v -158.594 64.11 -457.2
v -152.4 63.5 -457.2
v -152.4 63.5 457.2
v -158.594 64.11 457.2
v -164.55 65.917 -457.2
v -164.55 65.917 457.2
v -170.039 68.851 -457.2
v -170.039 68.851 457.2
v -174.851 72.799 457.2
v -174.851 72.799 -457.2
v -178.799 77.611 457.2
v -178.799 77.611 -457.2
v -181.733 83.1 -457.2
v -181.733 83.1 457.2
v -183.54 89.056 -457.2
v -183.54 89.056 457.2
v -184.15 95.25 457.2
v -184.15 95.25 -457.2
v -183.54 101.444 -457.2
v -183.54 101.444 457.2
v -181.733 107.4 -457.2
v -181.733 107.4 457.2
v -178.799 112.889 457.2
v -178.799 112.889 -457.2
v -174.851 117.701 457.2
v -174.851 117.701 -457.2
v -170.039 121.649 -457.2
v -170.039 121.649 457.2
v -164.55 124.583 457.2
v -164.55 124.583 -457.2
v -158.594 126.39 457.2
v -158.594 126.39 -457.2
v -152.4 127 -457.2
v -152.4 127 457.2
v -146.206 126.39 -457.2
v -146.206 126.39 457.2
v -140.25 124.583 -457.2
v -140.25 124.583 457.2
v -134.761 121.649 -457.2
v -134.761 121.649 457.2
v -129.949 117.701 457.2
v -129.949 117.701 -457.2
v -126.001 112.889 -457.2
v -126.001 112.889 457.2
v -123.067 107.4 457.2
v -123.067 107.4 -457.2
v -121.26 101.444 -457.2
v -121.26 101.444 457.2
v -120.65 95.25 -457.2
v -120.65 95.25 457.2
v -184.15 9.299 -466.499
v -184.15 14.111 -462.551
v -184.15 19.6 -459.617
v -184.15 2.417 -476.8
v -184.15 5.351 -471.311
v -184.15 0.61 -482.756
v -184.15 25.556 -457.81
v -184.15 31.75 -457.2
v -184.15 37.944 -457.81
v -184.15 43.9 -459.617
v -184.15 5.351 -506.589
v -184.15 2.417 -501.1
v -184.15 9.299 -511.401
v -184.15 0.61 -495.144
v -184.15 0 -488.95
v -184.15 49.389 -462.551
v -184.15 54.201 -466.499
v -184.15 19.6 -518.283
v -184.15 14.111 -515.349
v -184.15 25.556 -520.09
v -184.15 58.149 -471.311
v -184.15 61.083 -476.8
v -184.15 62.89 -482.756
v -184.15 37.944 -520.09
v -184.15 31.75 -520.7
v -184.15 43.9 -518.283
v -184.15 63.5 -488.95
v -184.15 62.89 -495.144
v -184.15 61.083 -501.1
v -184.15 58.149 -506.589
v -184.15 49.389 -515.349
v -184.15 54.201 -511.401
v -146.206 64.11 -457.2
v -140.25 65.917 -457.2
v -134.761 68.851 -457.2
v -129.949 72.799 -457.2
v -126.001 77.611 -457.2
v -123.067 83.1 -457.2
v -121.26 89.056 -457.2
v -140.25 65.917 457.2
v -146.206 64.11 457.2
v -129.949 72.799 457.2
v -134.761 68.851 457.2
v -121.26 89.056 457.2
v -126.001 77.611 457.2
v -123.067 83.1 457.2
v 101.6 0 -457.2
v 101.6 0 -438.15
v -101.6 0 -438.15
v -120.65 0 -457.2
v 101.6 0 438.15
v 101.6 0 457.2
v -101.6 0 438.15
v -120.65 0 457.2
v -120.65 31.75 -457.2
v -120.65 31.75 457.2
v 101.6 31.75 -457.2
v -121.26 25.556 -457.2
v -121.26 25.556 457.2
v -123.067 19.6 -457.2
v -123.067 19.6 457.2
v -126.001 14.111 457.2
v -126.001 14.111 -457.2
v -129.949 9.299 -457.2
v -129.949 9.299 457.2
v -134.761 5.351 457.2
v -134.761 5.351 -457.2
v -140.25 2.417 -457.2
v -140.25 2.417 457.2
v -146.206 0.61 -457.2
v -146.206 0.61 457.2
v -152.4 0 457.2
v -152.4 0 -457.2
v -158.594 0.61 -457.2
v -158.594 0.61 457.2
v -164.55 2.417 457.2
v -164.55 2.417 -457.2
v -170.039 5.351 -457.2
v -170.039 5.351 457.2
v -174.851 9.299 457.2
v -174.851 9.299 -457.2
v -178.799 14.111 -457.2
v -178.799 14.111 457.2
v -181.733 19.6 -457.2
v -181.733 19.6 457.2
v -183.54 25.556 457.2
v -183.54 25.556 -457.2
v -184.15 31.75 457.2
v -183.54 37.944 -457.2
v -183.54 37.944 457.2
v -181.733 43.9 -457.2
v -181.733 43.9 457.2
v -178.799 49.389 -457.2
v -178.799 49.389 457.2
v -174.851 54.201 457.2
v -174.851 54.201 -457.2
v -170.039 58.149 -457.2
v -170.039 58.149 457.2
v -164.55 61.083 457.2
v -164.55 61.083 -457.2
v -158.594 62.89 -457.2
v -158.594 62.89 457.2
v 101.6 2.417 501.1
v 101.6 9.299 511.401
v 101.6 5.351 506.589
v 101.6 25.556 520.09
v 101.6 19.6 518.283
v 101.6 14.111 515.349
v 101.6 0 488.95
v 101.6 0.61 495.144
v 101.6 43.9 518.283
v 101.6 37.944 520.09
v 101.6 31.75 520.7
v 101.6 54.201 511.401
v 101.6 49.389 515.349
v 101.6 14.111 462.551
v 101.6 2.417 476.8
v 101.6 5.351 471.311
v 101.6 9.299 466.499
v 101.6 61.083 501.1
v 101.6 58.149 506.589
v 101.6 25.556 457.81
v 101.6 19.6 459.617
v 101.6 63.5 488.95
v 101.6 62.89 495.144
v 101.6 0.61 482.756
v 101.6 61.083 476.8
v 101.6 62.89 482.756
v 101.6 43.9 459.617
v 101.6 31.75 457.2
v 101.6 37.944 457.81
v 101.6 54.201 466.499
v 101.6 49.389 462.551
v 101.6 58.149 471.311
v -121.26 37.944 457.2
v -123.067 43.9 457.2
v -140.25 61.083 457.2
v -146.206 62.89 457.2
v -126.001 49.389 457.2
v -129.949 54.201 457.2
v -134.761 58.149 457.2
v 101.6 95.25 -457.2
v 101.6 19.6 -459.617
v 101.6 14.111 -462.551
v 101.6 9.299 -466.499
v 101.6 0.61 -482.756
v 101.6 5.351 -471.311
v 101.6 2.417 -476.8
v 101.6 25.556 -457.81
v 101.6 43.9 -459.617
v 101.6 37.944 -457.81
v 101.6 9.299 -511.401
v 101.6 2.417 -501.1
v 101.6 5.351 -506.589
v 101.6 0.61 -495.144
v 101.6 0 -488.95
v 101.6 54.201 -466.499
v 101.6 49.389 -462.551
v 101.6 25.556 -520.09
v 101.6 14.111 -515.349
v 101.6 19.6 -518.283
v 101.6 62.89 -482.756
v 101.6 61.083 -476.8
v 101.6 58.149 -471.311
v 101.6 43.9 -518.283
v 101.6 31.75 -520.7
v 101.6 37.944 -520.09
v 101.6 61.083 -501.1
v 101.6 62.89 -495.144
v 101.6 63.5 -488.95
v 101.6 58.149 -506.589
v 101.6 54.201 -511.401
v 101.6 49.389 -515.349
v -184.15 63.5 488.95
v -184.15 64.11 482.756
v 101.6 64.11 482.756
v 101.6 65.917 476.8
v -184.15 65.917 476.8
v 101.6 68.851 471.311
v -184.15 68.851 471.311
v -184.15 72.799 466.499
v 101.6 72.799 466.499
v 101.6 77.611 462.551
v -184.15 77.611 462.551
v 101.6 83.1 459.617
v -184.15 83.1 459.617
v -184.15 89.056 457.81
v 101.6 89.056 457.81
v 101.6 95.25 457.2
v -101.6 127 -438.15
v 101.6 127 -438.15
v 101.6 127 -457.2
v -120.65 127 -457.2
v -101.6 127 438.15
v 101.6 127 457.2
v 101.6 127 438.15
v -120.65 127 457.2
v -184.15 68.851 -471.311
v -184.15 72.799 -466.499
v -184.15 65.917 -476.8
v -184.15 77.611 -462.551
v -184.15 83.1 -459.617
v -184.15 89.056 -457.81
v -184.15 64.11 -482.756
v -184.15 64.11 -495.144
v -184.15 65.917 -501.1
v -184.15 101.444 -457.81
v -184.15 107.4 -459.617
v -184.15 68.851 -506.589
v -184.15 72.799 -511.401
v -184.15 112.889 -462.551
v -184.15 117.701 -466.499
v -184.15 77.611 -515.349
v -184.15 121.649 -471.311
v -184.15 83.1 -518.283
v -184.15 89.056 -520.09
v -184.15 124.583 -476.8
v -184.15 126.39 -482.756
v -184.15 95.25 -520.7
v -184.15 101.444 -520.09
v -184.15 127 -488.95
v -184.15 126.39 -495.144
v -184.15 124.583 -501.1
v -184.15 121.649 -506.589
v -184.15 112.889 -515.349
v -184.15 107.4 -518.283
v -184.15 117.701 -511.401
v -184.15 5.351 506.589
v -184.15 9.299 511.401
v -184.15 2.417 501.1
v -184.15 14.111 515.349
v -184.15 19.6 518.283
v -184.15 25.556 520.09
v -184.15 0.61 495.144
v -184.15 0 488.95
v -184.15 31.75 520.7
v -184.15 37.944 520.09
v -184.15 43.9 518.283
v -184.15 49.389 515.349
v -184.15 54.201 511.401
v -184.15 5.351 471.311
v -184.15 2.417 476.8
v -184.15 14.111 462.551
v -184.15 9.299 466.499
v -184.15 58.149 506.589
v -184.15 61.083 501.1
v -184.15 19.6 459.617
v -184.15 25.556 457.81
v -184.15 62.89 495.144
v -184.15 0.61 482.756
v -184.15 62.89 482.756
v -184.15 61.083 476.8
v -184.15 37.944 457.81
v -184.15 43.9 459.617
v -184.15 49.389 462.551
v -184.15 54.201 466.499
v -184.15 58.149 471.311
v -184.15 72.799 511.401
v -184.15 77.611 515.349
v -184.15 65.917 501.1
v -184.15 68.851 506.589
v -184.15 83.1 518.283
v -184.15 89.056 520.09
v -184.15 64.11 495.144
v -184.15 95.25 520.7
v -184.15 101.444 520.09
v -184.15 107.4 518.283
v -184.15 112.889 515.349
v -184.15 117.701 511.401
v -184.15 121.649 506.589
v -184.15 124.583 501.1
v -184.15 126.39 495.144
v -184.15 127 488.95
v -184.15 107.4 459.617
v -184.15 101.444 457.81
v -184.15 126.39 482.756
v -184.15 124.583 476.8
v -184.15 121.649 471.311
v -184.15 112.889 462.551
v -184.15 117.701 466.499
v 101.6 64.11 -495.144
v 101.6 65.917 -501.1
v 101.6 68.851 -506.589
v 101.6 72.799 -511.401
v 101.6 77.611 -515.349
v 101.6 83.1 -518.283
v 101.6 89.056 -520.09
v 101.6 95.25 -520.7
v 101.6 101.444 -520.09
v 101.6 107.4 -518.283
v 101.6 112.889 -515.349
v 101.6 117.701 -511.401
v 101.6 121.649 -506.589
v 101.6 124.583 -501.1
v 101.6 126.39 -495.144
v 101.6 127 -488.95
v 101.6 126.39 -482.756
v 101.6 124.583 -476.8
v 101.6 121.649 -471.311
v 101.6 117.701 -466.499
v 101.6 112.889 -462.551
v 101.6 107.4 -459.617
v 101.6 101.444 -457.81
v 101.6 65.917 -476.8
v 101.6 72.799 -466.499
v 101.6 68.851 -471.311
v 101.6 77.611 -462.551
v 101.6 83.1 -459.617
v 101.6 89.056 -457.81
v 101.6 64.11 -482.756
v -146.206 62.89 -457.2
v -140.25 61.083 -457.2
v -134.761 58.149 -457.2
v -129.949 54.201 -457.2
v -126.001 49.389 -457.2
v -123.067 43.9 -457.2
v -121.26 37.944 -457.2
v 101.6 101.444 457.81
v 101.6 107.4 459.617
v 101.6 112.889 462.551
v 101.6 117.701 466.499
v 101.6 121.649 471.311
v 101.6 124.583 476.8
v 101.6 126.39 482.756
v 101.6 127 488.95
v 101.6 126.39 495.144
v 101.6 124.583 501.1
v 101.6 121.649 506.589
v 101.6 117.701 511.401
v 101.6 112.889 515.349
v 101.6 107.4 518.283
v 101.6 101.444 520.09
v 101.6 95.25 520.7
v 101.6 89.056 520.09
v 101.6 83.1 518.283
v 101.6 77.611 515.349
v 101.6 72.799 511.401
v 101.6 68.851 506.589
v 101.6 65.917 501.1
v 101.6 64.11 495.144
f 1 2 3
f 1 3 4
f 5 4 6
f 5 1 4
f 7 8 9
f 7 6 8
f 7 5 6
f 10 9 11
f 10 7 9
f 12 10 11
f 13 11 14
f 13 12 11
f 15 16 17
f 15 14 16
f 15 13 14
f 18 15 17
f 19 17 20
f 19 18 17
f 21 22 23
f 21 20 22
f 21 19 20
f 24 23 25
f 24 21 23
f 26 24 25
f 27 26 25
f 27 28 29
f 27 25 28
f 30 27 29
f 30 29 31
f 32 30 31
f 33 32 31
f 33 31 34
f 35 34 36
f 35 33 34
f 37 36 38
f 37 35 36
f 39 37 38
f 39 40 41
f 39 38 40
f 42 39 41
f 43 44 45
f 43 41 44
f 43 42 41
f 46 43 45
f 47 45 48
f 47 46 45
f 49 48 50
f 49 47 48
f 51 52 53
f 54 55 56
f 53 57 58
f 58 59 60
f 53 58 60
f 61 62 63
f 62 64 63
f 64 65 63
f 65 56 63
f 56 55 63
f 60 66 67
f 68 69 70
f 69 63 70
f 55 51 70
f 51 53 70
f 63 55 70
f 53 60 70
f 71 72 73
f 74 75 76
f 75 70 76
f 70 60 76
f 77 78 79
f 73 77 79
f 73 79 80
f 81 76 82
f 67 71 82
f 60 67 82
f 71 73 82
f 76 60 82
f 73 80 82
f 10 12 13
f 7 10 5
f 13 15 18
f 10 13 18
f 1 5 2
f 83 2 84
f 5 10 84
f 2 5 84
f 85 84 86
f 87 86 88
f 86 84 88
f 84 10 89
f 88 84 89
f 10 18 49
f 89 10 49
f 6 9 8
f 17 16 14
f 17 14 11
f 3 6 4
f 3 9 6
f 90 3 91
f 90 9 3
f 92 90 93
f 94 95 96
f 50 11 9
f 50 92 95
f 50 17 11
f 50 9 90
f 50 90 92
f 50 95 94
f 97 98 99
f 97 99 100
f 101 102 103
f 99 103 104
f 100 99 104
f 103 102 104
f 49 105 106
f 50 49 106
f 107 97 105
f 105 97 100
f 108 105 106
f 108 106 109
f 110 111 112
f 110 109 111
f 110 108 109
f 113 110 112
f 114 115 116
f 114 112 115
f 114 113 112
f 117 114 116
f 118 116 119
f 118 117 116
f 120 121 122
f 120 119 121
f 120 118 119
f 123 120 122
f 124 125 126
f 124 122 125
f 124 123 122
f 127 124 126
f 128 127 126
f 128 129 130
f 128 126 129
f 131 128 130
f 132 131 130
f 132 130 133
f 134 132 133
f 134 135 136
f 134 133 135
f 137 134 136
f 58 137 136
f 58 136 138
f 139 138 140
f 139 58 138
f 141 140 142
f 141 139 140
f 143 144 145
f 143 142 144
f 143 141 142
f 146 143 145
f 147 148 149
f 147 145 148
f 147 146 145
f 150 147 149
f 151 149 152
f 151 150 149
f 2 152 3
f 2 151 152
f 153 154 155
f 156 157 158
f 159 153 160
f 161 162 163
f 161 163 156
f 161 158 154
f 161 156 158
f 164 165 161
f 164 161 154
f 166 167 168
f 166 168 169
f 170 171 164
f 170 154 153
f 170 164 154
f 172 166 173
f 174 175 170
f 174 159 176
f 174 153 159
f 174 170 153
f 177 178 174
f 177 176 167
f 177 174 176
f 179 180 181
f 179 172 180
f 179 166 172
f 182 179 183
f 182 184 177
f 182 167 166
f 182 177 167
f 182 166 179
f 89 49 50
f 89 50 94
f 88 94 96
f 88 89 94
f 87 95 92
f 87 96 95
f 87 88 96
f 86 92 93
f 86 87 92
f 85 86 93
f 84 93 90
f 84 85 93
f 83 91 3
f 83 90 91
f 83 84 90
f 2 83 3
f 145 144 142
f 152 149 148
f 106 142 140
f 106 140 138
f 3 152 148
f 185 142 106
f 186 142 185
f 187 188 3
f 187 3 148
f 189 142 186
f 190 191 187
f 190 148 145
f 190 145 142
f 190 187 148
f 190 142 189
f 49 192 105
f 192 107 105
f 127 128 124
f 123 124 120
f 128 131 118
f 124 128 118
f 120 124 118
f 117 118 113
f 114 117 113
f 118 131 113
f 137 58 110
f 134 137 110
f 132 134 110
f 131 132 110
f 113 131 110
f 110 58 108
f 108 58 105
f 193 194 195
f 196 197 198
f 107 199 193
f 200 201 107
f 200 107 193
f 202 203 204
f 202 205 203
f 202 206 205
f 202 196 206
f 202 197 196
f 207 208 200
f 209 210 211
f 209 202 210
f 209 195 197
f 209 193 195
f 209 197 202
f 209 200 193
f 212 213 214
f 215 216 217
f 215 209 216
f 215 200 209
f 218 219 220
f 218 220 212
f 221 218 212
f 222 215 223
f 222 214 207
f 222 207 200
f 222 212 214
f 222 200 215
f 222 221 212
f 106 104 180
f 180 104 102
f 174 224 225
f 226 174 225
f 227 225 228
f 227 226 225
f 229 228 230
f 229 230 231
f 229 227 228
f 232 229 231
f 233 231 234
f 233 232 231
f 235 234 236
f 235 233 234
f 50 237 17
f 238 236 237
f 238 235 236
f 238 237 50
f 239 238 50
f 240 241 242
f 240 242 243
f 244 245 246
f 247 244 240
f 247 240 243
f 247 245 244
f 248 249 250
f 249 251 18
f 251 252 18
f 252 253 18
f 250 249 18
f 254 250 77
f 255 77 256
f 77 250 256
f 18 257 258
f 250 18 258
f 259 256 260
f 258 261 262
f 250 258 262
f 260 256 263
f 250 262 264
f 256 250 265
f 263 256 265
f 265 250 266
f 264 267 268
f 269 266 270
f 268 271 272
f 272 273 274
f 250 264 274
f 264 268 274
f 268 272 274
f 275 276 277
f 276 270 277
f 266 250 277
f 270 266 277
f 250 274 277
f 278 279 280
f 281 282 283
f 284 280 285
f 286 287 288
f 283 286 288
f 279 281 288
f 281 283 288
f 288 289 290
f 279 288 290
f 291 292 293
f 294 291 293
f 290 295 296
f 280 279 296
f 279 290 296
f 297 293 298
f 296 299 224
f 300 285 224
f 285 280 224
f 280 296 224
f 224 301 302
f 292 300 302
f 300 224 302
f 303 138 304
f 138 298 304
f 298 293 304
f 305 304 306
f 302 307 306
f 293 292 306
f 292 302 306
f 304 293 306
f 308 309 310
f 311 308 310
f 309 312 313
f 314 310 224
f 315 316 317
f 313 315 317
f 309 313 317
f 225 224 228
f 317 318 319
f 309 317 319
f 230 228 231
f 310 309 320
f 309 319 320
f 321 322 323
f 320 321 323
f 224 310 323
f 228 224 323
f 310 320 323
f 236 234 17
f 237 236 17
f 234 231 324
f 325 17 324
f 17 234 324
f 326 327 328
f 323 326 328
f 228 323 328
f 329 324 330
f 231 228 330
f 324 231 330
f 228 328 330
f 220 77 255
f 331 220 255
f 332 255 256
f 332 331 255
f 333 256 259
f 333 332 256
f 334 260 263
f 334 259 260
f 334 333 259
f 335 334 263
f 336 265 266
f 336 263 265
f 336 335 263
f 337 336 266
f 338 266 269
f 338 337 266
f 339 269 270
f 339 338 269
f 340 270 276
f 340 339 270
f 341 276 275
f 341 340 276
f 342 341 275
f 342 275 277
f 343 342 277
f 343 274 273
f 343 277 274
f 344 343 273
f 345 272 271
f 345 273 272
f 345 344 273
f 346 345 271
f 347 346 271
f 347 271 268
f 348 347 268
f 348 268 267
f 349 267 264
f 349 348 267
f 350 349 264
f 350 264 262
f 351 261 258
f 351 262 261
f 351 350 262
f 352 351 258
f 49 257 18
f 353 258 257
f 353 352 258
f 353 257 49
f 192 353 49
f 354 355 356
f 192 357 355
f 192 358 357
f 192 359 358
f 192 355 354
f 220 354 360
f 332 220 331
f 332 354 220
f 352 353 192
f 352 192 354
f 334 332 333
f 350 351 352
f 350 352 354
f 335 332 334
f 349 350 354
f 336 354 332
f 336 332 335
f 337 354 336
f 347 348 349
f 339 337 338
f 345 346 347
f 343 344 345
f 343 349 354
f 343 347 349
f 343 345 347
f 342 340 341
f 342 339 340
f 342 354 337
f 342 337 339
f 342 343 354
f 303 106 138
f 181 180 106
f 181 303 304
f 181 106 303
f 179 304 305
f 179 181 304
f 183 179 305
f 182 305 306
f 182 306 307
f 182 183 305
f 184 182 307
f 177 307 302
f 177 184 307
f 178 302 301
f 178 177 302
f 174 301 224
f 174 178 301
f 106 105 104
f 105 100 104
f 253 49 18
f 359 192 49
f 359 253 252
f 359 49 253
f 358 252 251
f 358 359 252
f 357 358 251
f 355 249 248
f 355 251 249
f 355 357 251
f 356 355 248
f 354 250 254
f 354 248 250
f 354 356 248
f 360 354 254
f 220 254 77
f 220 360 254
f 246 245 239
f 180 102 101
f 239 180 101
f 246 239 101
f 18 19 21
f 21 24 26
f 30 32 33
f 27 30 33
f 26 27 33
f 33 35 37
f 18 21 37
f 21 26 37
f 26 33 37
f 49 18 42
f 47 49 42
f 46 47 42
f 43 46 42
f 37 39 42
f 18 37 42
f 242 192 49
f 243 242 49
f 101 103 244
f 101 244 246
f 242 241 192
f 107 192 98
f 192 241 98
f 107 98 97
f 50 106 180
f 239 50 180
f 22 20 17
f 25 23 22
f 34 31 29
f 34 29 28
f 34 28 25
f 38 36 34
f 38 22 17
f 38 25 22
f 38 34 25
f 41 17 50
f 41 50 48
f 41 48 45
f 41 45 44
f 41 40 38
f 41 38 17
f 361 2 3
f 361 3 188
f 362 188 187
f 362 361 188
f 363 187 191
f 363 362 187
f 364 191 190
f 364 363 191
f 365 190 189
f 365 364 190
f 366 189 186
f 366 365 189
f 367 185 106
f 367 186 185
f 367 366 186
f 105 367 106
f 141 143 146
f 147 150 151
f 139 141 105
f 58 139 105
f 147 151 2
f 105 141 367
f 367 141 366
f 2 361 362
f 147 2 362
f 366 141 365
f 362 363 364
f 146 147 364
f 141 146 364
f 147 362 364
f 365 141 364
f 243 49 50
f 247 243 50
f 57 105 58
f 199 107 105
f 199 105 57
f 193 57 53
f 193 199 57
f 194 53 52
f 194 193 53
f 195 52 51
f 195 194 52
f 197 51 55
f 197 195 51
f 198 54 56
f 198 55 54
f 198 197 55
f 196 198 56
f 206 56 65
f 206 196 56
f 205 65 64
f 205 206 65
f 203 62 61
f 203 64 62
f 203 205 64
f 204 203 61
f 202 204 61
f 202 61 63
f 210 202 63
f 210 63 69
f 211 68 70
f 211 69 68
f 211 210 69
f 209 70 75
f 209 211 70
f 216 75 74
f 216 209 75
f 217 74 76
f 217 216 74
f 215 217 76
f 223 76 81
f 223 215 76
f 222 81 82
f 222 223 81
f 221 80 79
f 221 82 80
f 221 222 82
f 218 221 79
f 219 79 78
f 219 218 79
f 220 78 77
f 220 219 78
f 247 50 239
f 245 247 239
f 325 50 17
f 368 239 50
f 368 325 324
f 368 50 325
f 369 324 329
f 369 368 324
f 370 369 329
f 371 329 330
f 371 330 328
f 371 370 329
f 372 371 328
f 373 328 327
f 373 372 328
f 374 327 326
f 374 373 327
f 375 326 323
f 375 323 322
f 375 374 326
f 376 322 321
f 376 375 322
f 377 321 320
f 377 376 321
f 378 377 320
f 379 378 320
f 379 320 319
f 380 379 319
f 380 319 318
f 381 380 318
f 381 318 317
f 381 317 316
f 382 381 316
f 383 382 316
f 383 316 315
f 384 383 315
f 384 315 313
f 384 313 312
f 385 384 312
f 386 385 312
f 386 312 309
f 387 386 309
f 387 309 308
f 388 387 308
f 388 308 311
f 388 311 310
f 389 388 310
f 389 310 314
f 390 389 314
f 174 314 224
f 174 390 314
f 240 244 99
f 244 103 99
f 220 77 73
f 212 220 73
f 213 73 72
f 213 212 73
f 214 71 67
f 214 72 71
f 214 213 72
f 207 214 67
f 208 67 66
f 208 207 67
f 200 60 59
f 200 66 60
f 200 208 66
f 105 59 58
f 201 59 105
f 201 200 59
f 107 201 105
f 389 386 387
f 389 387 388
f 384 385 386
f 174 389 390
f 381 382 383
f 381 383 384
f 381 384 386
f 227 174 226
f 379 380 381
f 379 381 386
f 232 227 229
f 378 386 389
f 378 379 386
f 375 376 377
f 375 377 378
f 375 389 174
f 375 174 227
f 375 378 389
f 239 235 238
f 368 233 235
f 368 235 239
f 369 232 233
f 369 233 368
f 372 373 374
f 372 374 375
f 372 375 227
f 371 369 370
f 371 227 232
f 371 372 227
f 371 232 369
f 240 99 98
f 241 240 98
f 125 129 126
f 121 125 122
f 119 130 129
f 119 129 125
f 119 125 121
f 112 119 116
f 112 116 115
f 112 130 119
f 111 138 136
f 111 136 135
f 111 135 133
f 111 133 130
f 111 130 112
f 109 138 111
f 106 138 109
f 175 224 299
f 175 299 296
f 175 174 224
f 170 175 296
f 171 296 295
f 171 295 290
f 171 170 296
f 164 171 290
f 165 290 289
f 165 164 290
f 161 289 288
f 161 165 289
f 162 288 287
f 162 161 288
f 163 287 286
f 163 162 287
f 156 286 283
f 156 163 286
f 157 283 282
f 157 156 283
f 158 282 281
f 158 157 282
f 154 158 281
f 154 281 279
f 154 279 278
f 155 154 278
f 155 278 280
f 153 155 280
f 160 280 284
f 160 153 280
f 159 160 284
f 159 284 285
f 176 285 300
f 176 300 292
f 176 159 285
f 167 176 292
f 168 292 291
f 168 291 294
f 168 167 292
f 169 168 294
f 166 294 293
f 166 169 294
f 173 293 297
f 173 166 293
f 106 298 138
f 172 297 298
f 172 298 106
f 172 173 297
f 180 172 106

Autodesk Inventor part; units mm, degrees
ref_plane "YZ Plane" through (0, 0, 0) normal (1, 0, 0) x (0, 1, 0)
ref_plane "XZ Plane" through (0, 0, 0) normal (0, 1, 0) x (-1, 0, 0)
ref_plane "XY Plane" through (0, 0, 0) normal (0, 0, 1) x (1, 0, 0)
sketch "Sketch1" plane through (0, 0, 0) normal (0, 1, 0) x (-1, 0, 0)
  line L0 (101.6, 438.15) -> (101.6, -438.15)
  line L1 (101.6, -438.15) -> (-101.6, -438.15)
  line L2 (101.6, 438.15) -> (-101.6, 438.15)
  line L3 (-101.6, -438.15) -> (-101.6, -457.2)
  line L4 (-101.6, -457.2) -> (120.65, -457.2)
  line L5 (120.65, -457.2) -> (120.65, 457.2)
  line L6 (120.65, 457.2) -> (-101.6, 457.2)
  line L7 (-101.6, 457.2) -> (-101.6, 438.15)
  line L8 (0, -640.08) -> (0, 640.08) construction
  line L9 (165.1, 0) -> (-146.05, 0) construction
  point P0 (0, 0)
  dimension "d0" = 876.3
  dimension "d1" = 203.2
  dimension "d2" = 19.05
  dimension "d3" = 19.05
extrude "Extrusion1" add sketch "Sketch1" along normal blind 127
sketch "Sketch2" plane through (101.6, 0, 457.2) normal (1, 0, 0) x (0, 0, -1)
  circle A0 centre (-31.75, 95.25) radius 31.75
  circle A1 centre (-31.75, 31.75) radius 31.75
  line L0 (0, 0) -> (0, 127) projected
  line L1 (19.05, 127) -> (895.35, 127) projected
  point P0 (457.2, 0)
  dimension "d6" = 63.5
extrude "Extrusion2" add sketch "Sketch2" against normal blind 285.75 contours A0 | A1
mirror "Mirror1" about plane through (0, 0, 0) normal (0, 0, 1) of "Extrusion2"
sketch "Sketch3" plane through (-120.65, 127, 457.2) normal (0, 0, 1) x (1, 0, 0)
  circle A0 centre (-31.75, -31.75) radius 31.75
  circle A1 centre (-31.75, -95.25) radius 31.75
  line L0 (0, -31.75) -> (0, 0) projected
  line L1 (0, -95.25) -> (0, -31.75) projected
  line L2 (0, 0) -> (222.25, 0) projected
  line L3 (0, -127) -> (222.25, -127) projected
  line L4 (0, -127) -> (0, -95.25) projected
  point P0 (120.65, -127)
  dimension "d9" = 63.5
extrude "Extrusion3" add sketch "Sketch3" along normal up to surface (914.4 mm away) from surface at -914.4 contours A0 | A1
properties material "Plywood, Finish"
